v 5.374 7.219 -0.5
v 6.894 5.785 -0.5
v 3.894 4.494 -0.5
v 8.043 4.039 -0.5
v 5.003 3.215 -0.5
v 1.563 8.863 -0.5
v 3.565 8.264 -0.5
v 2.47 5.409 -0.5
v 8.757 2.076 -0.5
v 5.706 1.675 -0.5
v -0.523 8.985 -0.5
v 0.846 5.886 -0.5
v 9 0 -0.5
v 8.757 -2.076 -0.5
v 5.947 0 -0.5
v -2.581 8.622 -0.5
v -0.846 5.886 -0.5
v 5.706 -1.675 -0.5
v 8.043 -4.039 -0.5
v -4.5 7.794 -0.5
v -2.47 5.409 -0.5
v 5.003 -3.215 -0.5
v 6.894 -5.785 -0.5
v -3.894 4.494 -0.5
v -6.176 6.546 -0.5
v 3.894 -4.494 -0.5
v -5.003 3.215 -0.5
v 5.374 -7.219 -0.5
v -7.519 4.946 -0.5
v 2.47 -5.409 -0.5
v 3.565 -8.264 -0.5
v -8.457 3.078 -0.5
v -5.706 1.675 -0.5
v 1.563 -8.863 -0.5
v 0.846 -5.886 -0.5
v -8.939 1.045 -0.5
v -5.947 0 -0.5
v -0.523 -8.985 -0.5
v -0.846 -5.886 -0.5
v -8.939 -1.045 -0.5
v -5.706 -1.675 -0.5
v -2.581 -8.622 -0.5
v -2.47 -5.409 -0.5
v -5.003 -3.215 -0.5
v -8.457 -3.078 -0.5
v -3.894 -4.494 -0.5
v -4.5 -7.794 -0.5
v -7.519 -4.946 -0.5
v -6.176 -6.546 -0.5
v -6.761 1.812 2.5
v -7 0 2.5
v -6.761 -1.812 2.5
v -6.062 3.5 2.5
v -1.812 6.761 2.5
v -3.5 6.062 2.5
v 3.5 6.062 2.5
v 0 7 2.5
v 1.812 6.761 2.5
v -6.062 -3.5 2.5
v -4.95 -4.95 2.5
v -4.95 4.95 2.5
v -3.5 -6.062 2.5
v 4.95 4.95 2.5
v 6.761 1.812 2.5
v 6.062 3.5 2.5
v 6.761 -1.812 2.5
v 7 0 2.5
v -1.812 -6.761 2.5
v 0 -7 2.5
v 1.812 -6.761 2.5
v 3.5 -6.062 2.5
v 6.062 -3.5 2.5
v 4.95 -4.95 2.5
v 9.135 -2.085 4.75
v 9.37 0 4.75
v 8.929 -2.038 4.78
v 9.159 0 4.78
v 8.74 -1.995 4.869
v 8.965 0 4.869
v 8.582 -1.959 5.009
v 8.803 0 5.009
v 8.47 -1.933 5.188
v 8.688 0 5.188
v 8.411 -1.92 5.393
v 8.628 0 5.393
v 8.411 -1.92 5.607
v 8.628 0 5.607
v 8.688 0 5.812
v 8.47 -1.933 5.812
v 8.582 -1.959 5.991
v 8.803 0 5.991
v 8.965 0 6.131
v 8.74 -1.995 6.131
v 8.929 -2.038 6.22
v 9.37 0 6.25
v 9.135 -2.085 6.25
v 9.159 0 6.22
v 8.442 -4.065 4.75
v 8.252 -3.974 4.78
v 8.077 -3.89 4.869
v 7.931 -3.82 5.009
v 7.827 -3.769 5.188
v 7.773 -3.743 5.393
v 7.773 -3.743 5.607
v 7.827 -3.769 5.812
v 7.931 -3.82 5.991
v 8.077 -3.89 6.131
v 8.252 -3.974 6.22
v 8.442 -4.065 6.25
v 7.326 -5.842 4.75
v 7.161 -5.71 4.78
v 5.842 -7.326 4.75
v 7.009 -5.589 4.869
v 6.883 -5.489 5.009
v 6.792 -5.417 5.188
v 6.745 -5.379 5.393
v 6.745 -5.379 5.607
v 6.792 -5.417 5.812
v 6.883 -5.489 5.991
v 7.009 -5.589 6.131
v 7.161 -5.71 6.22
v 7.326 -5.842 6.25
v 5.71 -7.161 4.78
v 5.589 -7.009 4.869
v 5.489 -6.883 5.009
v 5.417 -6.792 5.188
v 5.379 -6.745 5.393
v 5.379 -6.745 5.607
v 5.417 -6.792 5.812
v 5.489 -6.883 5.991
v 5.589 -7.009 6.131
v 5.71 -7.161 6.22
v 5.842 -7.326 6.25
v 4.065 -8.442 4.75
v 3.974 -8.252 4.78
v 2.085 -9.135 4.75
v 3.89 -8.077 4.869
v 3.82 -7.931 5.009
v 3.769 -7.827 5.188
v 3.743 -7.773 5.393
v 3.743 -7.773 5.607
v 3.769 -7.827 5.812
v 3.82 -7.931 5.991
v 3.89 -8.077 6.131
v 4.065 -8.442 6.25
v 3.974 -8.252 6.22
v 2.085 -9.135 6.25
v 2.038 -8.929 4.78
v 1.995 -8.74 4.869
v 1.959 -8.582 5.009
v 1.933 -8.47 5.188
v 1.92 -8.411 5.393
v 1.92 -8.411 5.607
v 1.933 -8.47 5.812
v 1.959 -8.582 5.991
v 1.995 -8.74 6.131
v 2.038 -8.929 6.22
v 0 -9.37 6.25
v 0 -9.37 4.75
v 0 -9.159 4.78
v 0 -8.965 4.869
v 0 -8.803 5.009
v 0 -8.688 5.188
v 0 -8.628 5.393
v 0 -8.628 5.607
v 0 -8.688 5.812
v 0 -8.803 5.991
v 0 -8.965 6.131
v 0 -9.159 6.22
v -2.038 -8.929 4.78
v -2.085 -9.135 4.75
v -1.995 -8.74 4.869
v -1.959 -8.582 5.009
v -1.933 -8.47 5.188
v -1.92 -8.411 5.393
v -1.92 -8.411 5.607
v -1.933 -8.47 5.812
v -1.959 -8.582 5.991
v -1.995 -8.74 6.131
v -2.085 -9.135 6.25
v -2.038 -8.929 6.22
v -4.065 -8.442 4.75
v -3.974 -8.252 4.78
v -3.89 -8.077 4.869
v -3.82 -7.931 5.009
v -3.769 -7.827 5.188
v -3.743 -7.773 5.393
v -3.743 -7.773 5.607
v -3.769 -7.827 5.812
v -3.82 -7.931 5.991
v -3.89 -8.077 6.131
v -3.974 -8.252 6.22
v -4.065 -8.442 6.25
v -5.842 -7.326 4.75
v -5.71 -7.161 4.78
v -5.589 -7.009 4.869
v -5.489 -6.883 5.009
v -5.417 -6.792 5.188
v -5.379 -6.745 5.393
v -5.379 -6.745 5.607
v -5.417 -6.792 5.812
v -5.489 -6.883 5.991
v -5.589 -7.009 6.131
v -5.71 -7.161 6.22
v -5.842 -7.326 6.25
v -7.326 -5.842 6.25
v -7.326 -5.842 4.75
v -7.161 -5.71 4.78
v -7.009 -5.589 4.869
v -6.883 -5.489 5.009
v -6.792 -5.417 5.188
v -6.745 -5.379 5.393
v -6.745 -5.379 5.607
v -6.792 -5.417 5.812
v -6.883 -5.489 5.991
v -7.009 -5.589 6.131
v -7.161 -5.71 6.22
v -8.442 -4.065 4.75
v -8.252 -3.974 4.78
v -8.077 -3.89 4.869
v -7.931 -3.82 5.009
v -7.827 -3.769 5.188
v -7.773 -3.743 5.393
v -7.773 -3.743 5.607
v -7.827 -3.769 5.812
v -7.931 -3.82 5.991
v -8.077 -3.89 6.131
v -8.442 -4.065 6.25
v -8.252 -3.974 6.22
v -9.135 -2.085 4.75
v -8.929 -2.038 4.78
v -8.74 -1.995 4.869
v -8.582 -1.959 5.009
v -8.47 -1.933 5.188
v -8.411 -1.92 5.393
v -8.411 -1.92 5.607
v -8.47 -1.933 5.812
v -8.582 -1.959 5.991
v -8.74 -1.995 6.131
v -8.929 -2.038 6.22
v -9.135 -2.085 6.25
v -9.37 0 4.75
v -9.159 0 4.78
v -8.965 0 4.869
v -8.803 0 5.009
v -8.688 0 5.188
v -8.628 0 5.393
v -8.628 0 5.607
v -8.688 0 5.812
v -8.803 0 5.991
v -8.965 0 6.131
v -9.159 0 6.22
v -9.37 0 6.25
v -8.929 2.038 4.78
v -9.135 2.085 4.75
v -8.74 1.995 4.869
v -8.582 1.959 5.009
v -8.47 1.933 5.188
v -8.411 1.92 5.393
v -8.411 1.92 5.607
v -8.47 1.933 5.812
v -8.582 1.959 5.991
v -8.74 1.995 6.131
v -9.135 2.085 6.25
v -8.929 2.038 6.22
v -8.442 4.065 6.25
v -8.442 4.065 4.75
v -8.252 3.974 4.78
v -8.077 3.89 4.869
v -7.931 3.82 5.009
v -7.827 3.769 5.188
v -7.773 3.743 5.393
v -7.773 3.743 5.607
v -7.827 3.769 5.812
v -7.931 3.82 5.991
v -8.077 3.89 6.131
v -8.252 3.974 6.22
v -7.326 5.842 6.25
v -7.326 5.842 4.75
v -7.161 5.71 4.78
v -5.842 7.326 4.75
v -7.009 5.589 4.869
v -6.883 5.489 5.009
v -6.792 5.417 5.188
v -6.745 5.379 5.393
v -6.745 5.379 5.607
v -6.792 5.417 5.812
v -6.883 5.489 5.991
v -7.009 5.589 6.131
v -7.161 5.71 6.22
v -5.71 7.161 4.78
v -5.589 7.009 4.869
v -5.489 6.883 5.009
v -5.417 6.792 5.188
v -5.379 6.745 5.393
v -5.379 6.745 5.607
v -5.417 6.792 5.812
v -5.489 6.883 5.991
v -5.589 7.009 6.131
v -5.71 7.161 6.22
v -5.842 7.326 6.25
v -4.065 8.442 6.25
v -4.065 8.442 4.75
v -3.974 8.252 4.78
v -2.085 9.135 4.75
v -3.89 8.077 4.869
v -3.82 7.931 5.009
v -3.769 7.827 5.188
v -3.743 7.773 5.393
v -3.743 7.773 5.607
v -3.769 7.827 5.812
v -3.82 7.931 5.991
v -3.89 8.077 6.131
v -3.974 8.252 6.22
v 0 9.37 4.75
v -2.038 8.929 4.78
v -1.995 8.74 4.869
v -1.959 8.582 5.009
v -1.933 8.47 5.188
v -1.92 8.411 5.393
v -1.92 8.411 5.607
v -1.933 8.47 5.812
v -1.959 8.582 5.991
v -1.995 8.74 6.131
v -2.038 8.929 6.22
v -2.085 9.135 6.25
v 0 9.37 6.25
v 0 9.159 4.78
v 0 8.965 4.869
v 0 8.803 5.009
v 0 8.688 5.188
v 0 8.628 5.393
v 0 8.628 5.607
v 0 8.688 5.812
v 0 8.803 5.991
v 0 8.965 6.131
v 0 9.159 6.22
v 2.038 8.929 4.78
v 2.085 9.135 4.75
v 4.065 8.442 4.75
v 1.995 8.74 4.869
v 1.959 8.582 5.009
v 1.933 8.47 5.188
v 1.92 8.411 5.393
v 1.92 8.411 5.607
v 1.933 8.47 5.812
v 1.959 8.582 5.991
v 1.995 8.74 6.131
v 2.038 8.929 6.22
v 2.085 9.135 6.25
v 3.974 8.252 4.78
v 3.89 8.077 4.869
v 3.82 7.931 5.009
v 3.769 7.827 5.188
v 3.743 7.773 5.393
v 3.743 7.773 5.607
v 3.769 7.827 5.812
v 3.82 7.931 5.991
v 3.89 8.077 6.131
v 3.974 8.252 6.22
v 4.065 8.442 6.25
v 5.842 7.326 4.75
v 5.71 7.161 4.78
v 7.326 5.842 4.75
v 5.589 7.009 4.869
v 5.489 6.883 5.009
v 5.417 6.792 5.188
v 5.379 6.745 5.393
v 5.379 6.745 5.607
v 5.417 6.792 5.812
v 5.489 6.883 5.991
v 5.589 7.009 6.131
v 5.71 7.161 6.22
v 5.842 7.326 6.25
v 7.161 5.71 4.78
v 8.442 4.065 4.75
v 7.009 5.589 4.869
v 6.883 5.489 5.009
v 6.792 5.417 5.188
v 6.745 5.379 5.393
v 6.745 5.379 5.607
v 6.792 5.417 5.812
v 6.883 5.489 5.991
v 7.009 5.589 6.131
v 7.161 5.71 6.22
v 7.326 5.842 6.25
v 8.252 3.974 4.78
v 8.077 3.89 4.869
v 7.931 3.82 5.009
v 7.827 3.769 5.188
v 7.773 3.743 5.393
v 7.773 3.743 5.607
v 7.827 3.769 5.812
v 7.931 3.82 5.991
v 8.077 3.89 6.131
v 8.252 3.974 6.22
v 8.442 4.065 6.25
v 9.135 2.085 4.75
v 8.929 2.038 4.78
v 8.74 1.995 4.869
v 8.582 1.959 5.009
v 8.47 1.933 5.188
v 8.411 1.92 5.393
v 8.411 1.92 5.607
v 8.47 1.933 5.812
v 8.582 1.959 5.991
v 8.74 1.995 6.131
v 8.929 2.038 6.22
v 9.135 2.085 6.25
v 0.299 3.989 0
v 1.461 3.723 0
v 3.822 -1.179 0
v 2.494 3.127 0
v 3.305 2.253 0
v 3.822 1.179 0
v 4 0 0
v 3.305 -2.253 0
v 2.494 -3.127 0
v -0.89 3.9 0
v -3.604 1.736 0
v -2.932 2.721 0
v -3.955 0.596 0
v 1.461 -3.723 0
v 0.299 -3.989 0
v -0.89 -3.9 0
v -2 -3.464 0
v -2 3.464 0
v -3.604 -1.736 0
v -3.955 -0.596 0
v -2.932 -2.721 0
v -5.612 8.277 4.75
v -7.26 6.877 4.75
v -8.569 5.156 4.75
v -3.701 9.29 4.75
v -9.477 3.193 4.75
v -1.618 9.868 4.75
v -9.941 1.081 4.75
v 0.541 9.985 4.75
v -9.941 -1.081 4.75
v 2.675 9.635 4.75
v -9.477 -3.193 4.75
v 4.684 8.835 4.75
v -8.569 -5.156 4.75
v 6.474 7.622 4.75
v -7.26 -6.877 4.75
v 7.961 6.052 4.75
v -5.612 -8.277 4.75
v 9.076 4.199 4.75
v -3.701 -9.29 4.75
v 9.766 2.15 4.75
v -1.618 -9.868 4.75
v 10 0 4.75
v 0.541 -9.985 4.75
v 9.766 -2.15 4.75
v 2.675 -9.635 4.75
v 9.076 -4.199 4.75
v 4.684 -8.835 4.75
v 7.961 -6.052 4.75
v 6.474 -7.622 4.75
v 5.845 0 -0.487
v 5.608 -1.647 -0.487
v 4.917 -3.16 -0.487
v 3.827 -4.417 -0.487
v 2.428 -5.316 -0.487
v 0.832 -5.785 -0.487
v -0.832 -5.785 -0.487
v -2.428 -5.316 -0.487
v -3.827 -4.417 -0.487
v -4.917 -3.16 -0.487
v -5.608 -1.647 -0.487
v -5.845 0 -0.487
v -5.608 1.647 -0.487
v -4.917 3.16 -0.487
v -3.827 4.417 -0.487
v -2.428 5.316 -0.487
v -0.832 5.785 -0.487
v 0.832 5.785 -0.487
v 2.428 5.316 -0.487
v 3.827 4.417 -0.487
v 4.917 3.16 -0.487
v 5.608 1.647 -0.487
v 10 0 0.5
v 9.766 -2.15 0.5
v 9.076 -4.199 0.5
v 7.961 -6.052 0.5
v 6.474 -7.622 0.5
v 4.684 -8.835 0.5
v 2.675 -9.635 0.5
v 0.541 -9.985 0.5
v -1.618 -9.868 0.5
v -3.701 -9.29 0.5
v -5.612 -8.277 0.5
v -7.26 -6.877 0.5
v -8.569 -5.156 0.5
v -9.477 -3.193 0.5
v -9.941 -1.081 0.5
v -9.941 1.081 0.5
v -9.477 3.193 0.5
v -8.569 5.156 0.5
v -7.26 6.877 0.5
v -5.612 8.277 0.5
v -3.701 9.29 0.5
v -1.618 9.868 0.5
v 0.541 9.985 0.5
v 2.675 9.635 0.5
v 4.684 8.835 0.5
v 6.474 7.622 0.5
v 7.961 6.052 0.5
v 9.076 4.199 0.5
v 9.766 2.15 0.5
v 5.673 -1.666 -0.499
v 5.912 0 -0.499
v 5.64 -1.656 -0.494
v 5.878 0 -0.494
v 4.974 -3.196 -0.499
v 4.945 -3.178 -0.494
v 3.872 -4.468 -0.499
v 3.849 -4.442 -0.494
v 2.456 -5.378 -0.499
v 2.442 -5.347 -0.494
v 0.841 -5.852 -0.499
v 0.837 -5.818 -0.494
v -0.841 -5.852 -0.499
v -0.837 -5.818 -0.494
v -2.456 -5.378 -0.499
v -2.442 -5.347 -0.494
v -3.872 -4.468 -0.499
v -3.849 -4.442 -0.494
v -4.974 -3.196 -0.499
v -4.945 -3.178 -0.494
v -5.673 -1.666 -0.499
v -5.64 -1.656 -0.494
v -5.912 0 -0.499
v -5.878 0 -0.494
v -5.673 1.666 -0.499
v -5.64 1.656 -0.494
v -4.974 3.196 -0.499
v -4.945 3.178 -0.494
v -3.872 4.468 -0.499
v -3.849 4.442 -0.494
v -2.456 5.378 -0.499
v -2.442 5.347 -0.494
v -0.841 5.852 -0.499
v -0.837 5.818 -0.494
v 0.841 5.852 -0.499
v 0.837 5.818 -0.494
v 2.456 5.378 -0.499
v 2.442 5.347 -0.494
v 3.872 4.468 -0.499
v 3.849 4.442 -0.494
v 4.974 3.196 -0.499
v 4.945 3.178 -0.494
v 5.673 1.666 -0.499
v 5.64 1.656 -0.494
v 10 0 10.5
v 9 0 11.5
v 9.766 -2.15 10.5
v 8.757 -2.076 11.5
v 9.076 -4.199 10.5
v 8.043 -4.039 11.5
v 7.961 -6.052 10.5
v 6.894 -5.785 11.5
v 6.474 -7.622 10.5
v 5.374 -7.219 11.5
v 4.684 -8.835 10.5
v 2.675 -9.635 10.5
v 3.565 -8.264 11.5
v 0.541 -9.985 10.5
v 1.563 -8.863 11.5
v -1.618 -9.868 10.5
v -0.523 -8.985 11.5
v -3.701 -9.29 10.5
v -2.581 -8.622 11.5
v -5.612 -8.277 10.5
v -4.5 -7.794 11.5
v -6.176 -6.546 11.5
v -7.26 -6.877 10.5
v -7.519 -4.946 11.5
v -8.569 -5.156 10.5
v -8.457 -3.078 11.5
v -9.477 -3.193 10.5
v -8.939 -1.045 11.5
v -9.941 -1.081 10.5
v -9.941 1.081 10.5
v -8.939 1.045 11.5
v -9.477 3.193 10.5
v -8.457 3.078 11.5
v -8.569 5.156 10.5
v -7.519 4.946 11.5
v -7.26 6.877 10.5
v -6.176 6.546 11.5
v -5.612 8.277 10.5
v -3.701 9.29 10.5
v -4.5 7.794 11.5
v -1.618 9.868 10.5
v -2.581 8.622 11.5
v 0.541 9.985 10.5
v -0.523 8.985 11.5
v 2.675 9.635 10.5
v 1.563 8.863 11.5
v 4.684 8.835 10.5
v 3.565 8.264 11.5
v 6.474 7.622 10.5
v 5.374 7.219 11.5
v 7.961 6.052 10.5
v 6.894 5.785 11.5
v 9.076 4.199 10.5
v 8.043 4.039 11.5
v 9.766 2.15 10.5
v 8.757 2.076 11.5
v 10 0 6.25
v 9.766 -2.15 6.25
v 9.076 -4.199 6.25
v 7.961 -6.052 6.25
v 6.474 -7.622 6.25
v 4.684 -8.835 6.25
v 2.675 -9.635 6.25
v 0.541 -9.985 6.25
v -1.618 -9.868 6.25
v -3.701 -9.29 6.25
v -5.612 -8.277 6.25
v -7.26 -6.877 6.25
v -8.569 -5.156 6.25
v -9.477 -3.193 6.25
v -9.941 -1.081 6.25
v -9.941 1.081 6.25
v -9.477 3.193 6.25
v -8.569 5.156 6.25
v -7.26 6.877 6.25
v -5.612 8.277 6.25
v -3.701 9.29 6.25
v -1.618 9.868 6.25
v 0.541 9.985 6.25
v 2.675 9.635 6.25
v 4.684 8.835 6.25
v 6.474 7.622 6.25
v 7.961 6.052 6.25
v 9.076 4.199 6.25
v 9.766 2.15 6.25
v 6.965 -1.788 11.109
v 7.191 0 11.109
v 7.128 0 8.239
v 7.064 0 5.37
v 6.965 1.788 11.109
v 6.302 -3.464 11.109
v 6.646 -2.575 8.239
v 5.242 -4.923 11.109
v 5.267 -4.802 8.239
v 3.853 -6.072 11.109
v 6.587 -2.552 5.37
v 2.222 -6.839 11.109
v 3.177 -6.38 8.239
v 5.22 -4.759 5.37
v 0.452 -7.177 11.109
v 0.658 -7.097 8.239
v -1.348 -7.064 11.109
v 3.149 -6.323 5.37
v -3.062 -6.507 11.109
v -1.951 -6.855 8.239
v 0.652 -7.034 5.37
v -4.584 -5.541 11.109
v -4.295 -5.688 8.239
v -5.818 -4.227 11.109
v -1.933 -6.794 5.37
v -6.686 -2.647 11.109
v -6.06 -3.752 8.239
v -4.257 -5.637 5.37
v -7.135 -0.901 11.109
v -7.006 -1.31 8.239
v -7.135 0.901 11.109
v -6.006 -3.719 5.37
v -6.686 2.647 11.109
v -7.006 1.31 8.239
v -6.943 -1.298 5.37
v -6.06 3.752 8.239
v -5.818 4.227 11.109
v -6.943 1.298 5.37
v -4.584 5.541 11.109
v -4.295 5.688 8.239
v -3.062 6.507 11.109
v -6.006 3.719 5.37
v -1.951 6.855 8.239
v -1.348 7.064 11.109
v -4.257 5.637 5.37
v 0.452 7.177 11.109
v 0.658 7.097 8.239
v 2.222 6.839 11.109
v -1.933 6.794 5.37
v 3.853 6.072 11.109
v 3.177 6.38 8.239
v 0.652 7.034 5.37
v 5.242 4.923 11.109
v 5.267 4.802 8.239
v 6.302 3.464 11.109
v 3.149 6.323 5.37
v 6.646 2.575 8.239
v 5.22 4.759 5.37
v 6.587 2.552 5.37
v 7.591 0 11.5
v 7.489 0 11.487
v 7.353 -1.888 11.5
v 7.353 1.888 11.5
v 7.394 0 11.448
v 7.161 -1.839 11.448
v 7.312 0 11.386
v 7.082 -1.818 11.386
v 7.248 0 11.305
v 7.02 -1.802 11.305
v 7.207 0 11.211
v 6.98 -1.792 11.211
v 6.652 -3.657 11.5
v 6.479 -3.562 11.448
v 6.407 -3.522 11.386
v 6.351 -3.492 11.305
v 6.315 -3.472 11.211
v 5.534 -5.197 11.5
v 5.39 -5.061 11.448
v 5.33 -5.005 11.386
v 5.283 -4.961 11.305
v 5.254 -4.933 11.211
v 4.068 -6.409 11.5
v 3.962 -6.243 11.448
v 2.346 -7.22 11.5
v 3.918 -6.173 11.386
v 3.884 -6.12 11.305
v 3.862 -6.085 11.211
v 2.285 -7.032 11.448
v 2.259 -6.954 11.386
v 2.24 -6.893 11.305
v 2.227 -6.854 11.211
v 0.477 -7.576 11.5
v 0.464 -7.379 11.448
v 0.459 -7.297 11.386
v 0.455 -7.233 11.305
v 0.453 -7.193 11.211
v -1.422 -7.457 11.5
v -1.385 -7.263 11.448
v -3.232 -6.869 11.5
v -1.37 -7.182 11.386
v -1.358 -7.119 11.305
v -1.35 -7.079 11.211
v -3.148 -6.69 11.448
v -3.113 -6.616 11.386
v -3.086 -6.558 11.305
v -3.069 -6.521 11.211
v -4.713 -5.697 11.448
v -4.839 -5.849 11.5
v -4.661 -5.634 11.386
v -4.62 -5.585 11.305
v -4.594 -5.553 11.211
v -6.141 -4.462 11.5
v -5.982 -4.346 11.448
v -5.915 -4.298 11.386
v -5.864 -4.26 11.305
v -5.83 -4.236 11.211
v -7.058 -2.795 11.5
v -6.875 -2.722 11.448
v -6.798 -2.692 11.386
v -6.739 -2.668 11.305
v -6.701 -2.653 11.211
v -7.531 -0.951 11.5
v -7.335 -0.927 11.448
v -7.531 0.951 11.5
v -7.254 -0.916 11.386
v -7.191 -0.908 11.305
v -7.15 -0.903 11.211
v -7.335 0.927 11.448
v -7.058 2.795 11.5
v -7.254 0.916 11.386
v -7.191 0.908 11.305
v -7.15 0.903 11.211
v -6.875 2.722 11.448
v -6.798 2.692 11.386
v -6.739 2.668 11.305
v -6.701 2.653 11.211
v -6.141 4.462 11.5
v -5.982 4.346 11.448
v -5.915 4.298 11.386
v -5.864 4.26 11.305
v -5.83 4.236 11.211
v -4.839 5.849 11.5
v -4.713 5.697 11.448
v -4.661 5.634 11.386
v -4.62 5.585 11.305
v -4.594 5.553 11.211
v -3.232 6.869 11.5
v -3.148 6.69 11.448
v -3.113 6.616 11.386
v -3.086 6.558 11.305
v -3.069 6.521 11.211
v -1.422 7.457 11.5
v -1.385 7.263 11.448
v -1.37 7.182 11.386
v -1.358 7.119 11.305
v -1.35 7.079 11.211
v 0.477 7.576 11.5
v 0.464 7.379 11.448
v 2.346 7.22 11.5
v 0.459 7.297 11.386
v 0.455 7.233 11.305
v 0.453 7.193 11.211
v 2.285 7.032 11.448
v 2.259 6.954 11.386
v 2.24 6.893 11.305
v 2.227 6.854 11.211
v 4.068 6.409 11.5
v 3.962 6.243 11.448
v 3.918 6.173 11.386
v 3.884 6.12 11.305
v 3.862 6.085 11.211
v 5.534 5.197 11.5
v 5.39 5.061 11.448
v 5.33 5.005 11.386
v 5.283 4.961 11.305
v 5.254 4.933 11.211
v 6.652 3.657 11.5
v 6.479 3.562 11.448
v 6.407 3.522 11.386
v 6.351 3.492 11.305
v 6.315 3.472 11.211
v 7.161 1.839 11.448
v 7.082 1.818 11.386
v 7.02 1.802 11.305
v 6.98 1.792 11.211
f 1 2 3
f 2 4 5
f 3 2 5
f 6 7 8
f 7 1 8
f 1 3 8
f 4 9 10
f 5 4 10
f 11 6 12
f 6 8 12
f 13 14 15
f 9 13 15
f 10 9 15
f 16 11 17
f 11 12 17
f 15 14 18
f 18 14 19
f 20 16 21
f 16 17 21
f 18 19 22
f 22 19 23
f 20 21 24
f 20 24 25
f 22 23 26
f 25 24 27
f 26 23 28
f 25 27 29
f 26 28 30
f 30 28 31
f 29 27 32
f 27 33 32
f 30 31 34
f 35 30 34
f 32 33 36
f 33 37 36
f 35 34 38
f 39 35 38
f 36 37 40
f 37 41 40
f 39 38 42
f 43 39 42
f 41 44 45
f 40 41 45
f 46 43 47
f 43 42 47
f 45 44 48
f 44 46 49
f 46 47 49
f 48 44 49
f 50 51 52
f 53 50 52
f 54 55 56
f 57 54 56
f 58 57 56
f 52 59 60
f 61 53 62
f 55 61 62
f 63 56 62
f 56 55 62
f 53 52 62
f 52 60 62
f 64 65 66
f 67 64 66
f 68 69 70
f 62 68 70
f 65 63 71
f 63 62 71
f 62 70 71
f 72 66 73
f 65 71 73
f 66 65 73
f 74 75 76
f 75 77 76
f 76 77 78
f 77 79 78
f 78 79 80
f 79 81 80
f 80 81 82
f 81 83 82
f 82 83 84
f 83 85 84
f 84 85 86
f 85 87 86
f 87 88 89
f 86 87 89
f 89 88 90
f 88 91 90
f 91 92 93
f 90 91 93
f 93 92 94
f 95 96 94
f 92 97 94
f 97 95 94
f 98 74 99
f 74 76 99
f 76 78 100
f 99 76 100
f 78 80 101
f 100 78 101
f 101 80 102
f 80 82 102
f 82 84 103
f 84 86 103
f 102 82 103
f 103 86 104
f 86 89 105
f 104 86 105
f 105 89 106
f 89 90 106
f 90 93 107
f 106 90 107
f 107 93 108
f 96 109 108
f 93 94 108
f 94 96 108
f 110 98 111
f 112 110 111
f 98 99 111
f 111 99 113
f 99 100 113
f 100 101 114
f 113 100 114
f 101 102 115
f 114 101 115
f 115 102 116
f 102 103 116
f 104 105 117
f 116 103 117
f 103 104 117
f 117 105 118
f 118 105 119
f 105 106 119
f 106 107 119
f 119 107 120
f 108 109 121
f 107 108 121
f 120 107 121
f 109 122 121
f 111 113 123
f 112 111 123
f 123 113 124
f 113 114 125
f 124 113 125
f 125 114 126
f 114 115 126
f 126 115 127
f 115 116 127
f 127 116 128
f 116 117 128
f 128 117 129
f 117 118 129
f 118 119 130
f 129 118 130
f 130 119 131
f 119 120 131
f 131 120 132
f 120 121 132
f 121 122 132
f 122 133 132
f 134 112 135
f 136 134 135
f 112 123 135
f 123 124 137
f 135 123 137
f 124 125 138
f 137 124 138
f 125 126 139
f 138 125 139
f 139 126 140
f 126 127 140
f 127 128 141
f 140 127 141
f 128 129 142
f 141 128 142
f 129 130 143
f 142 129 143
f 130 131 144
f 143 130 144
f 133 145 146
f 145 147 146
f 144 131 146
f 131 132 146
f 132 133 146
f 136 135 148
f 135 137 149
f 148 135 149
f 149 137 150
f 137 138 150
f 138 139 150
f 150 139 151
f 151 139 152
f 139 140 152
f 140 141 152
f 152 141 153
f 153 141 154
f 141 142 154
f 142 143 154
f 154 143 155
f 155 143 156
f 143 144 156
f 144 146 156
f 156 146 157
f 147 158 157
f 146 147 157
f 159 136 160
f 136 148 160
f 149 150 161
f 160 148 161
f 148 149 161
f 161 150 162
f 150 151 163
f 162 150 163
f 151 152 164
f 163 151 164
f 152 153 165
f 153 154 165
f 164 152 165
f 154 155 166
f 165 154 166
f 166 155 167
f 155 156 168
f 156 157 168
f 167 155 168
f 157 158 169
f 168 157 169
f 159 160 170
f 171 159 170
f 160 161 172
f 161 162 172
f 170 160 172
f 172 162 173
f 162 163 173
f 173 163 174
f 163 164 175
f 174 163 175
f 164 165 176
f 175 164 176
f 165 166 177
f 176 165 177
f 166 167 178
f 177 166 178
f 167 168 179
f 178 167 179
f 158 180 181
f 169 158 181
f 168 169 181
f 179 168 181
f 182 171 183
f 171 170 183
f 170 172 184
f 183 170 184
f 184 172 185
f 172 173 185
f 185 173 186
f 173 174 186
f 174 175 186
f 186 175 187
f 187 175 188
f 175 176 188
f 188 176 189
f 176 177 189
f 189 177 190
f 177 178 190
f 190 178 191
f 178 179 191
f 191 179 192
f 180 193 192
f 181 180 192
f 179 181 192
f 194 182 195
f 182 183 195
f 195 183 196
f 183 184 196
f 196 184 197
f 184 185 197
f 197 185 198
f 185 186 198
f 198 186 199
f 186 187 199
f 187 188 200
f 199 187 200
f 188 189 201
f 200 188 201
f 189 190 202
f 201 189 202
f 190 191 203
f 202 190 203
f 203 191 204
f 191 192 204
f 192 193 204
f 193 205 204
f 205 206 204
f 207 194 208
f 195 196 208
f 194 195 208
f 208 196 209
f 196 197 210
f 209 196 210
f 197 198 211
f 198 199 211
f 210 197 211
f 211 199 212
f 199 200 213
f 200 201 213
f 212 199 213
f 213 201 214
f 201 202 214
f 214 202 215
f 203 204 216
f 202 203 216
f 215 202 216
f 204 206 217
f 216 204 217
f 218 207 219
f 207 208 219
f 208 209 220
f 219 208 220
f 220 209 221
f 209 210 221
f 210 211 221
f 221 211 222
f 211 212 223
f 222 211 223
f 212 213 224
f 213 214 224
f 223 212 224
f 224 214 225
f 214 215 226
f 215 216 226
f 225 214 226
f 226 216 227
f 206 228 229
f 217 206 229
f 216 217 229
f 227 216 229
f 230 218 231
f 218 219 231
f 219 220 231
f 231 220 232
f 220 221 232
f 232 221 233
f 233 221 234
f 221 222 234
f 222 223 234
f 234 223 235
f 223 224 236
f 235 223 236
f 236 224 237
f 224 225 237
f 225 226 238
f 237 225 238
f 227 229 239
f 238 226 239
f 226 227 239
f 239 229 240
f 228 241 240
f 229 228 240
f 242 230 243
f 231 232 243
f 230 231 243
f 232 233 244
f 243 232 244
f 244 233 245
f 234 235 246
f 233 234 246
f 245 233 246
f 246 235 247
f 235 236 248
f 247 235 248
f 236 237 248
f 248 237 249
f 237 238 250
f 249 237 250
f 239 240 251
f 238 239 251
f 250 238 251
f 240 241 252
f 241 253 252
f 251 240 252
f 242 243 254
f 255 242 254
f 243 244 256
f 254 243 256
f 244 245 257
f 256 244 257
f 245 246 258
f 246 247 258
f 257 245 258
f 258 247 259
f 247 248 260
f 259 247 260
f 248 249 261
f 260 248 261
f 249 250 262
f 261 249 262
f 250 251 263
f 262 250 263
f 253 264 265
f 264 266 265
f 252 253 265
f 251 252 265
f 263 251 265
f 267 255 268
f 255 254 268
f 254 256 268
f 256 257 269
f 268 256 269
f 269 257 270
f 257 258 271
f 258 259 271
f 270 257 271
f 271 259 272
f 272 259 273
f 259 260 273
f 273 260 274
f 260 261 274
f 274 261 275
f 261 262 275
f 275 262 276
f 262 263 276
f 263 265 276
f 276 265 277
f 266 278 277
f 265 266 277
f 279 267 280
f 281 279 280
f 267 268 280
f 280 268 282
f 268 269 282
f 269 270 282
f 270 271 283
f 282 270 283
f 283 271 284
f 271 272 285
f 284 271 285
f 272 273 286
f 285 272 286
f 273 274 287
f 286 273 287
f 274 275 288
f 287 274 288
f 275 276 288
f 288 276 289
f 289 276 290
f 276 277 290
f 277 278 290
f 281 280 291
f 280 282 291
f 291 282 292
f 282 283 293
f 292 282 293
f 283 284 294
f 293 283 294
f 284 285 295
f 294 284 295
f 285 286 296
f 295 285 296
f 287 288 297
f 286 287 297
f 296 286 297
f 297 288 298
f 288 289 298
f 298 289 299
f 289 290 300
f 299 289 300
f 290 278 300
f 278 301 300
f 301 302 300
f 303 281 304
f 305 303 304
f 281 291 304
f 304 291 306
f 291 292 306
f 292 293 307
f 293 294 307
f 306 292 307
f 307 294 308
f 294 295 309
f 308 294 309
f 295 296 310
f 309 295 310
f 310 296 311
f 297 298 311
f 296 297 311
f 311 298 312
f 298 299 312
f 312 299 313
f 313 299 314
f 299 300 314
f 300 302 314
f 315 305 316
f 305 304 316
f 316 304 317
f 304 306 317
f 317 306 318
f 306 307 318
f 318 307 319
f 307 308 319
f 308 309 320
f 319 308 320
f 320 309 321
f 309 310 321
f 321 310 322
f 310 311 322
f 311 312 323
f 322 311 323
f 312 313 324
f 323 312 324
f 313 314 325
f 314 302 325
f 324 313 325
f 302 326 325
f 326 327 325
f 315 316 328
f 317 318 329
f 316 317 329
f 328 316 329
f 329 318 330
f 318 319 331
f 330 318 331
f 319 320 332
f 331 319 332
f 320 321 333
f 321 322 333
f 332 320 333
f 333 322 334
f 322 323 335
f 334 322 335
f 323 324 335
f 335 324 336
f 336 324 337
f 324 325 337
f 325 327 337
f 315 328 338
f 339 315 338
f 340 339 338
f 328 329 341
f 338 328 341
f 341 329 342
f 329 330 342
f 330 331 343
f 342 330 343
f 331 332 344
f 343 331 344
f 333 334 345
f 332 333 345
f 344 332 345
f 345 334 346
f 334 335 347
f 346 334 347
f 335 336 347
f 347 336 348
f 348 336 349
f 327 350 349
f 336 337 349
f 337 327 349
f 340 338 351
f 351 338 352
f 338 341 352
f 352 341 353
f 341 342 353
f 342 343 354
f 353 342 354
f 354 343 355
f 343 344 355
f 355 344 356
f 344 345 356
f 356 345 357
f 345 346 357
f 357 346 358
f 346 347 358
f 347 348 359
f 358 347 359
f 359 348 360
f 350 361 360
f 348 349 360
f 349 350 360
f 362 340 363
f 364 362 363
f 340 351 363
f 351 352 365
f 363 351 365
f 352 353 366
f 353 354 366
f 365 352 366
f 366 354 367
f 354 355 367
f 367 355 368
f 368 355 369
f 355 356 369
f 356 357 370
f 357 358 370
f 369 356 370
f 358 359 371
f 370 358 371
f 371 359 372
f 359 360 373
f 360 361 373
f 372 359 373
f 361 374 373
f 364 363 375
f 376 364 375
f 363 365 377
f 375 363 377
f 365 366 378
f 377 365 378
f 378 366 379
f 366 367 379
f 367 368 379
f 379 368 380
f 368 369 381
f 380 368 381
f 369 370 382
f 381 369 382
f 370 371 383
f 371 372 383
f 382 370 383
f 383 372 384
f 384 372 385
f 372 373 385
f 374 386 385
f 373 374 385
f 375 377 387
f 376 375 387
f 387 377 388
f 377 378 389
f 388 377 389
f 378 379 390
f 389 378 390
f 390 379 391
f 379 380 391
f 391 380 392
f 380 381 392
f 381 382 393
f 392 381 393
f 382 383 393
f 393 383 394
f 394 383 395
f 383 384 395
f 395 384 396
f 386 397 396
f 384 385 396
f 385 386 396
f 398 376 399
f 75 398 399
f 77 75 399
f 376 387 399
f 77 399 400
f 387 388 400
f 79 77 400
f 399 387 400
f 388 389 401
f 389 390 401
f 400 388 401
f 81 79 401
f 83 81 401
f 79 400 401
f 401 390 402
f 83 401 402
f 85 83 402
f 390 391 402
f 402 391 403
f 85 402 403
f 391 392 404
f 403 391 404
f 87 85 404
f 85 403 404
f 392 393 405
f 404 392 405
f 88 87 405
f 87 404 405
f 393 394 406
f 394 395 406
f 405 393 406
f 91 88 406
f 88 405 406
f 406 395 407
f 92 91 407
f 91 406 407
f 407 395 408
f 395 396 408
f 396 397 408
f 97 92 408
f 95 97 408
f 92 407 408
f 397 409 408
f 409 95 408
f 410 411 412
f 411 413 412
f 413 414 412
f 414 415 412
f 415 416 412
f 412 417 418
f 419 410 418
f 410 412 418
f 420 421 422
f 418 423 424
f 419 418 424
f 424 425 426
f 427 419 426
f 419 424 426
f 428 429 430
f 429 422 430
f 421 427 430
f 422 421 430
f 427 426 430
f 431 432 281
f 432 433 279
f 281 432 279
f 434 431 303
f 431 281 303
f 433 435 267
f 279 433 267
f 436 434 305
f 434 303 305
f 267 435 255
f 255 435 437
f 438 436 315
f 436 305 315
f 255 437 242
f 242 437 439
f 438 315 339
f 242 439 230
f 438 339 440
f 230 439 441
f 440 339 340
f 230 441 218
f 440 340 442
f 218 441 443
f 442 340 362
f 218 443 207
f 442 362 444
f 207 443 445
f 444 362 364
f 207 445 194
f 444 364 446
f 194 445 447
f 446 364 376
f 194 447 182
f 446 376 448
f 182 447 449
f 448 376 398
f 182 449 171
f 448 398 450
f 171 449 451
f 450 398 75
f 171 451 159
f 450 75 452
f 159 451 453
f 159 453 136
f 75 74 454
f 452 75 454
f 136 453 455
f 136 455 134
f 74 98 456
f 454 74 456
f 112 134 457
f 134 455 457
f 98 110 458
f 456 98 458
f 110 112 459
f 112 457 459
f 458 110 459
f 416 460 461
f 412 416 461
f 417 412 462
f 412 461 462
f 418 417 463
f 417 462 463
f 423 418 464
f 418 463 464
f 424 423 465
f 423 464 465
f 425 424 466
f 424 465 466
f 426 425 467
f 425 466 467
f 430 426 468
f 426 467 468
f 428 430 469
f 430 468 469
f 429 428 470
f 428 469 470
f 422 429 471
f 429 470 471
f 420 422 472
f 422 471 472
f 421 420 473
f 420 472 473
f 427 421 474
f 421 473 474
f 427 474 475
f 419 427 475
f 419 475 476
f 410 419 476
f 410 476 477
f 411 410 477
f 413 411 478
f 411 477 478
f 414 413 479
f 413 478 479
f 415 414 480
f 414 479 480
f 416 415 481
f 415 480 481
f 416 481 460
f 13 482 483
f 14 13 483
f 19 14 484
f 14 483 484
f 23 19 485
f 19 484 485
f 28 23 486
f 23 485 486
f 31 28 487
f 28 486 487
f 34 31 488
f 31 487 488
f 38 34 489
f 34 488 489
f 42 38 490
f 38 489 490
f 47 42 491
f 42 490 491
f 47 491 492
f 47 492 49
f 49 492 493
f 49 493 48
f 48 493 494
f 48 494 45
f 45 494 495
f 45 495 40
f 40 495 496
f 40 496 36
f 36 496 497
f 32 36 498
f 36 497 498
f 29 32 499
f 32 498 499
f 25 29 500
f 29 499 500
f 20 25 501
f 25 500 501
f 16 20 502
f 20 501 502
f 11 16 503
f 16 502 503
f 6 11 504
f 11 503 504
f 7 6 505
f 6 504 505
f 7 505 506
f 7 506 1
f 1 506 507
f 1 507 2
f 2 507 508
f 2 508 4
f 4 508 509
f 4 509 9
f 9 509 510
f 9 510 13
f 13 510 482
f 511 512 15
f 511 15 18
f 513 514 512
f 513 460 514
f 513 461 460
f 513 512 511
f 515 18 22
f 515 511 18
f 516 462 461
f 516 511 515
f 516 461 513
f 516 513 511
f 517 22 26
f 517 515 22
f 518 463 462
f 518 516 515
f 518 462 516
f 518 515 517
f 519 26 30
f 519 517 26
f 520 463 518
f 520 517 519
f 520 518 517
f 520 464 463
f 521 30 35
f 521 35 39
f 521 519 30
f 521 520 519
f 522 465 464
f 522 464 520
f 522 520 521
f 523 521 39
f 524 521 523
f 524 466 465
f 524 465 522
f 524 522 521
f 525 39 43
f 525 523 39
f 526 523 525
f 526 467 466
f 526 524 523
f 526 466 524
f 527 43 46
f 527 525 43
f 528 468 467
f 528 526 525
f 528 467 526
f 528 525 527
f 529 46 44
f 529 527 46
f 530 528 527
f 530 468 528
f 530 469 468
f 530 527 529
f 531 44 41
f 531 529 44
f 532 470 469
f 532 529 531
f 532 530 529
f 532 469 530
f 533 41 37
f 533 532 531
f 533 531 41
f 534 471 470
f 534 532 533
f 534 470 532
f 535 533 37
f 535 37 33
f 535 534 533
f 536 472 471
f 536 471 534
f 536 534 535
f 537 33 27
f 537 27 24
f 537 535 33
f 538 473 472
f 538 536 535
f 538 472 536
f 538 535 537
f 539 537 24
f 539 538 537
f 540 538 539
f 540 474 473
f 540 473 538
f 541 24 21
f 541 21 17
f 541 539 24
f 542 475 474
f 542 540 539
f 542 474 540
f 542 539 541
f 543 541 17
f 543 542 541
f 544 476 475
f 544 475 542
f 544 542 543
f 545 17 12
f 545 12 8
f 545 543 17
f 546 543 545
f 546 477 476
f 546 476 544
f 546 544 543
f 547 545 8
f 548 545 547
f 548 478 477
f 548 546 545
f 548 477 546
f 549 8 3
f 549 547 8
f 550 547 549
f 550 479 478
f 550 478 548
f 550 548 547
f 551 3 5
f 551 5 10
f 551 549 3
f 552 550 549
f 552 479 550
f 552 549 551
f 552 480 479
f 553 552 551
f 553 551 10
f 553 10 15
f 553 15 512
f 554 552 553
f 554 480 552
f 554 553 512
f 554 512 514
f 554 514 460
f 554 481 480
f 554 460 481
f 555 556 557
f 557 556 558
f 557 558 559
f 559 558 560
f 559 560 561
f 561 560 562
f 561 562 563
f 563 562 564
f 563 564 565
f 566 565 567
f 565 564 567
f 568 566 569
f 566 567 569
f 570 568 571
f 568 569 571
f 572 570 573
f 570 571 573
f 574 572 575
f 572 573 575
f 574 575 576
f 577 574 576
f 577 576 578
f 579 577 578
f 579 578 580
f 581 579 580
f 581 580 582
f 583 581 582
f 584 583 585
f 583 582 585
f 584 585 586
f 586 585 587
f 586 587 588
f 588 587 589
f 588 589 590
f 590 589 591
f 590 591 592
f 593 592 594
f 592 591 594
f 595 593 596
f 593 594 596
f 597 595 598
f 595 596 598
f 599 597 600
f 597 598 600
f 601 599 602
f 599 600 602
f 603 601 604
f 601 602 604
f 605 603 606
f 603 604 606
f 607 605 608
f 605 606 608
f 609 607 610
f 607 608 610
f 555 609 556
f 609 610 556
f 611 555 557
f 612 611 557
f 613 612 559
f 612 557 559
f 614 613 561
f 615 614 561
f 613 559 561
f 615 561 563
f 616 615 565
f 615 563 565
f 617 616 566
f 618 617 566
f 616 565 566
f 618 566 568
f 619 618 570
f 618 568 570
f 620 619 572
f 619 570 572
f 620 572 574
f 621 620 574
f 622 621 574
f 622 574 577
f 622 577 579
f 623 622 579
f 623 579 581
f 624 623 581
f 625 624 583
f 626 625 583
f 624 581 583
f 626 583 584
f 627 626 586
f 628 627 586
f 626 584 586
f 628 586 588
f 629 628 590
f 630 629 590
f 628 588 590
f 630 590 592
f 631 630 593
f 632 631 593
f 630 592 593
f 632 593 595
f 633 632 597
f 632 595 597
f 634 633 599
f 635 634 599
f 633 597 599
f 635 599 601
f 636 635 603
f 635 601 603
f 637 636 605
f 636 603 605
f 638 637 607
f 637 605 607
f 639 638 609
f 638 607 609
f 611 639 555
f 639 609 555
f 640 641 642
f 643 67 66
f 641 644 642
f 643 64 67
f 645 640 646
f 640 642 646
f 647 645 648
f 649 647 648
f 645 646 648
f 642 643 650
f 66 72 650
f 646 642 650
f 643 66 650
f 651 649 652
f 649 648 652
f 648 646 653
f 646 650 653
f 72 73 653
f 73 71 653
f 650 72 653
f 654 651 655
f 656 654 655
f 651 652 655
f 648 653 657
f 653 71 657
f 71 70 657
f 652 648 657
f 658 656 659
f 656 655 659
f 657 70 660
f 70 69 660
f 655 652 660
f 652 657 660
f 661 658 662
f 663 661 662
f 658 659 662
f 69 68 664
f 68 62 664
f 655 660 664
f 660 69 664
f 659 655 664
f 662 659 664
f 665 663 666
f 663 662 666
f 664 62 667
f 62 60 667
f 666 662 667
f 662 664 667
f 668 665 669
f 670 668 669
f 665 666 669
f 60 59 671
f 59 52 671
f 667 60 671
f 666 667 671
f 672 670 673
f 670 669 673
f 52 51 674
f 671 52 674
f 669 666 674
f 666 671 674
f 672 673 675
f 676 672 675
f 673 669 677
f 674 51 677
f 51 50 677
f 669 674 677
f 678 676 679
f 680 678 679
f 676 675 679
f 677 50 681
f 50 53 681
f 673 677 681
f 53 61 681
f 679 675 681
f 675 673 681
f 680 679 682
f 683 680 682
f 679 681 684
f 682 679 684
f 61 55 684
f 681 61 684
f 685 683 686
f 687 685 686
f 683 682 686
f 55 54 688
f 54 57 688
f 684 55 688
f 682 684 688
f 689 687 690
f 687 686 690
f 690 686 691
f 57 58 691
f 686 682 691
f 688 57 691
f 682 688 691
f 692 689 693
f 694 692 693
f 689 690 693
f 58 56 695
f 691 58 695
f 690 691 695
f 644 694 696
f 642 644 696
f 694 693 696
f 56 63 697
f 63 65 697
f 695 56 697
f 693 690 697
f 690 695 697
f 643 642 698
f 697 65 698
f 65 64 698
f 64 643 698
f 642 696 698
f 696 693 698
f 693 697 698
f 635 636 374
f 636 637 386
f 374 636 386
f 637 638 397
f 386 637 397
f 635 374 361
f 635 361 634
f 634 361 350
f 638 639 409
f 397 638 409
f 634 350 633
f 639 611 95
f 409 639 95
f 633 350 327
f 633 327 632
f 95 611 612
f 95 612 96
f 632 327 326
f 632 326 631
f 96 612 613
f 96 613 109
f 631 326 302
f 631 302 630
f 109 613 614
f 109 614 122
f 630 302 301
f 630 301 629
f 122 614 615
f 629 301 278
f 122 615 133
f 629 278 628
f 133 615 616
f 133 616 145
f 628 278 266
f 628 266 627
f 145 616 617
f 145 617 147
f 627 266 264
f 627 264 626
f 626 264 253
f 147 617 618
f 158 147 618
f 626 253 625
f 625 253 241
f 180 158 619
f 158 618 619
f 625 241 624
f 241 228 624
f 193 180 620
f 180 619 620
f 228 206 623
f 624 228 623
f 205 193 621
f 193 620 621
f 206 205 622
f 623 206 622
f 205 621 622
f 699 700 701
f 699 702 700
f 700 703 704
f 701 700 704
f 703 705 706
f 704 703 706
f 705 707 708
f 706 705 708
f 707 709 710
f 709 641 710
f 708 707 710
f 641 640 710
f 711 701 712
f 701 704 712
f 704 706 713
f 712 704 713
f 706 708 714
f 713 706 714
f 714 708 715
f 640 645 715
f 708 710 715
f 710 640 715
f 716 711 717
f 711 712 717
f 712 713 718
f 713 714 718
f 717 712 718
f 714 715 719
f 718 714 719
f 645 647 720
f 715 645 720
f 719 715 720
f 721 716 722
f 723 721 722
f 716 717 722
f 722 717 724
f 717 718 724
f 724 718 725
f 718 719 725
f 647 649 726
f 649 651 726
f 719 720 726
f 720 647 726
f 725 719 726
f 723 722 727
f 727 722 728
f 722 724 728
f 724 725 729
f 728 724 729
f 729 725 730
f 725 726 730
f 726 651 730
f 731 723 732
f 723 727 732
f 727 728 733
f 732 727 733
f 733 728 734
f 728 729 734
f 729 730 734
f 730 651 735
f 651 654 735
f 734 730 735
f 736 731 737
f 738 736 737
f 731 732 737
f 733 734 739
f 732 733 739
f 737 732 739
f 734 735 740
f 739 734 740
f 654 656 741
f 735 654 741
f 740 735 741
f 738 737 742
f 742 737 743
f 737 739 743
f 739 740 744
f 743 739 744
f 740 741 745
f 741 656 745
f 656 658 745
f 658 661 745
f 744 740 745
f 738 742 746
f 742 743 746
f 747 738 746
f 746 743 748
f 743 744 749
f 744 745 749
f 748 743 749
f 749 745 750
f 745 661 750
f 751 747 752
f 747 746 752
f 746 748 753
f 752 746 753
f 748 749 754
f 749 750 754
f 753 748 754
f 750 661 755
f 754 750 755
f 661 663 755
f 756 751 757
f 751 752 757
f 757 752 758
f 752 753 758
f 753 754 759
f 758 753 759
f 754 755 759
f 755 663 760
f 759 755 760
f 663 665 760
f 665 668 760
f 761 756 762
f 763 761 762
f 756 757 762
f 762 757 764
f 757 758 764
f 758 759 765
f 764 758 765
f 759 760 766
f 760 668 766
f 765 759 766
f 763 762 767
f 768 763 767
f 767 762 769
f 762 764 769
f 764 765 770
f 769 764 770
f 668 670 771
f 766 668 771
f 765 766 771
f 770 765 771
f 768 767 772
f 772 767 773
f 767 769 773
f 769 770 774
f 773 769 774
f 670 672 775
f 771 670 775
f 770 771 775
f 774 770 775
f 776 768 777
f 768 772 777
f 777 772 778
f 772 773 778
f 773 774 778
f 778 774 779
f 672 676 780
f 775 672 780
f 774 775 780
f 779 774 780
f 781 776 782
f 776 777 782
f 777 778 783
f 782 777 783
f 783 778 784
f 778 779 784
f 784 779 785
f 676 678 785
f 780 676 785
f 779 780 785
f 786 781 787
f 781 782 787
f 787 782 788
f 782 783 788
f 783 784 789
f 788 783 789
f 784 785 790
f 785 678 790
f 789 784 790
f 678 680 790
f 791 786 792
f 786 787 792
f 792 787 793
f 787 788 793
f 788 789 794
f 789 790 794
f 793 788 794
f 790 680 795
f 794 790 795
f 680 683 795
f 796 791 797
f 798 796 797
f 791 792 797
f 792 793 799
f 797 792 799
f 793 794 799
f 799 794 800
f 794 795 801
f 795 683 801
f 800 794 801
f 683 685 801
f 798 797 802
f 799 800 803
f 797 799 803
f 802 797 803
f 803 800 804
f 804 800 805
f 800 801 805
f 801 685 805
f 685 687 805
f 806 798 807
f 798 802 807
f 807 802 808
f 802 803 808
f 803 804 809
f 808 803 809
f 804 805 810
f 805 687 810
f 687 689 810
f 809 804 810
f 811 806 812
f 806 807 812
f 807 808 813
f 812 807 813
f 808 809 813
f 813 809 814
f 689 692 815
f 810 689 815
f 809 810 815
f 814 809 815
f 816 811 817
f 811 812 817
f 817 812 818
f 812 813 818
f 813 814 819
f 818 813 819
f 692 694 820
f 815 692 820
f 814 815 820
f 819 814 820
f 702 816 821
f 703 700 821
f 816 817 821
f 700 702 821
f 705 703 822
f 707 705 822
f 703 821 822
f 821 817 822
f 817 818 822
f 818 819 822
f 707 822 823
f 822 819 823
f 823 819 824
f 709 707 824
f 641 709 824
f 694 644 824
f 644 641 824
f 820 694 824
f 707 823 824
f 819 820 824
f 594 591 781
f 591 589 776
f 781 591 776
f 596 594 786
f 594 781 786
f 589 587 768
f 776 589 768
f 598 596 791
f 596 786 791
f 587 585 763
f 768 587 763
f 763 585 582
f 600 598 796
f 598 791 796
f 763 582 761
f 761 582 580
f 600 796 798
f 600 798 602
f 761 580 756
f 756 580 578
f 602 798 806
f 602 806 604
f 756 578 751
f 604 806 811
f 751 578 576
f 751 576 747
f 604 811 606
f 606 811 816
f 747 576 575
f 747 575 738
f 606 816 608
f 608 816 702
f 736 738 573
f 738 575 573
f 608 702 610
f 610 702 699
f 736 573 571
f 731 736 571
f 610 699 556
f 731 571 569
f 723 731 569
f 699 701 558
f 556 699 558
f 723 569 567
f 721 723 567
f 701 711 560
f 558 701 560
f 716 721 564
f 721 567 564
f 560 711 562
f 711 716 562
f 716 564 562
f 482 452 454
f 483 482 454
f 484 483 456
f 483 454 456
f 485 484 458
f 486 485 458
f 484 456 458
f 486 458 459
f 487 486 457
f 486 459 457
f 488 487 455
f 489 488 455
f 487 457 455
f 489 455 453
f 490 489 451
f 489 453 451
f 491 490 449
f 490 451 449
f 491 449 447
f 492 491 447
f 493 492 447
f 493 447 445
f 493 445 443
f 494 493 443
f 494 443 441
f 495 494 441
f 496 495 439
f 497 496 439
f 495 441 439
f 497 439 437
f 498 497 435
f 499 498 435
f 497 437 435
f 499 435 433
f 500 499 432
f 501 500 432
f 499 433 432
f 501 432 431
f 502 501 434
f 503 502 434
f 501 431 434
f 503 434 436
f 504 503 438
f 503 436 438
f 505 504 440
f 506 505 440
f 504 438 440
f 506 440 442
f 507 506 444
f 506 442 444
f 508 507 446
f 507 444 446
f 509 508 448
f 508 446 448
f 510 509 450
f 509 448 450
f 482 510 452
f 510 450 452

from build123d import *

# Parameters (mm, degrees)
CHAMFER_1_SIZE = 1
FILLET_1_R     = 0.4


with BuildPart() as part:
    # 스케치1 → 회전1 (revolve)
    with BuildSketch(Plane(origin=(0, 0, 0), x_dir=(1, 0, 0), z_dir=(0, 1, 0))):
        with BuildLine():
            Line((0, 0), (4, 0))
            Line((4, 0), (5.894700279, 0.5))
            Line((5.894700279, 0.5), (10, 0.5))
            Line((10, 0.5), (10, -4.75))
            Line((10, -4.75), (9.37, -4.75))
            ThreePointArc((9.37, -4.75), (8.62, -5.5), (9.37, -6.25))
            Line((9.37, -6.25), (10, -6.25))
            Line((10, -6.25), (10, -11.5))
            Line((10, -11.5), (7.2, -11.5))
            Line((7.2, -11.5), (7, -2.5))
            Line((7, -2.5), (0, -2.5))
            Line((0, -2.5), (0, 0))
        make_face()
    revolve(axis=Axis((0, 0, 2.5), (0, 0, -1)))

    # 모따기1
    chamfer_1_edges = [part.edges().sort_by_distance(p)[0] for p in [
        (-10, 0, 11.5),
        (-10, 0, -0.5),
    ]]
    chamfer(chamfer_1_edges, length=CHAMFER_1_SIZE)

    # 필렛1
    fillet_1_edges = [part.edges().sort_by_distance(p)[0] for p in [
        (-7.2, 0, 11.5),
        (-5.894700279, 0, -0.5),
    ]]
    fillet(fillet_1_edges, radius=FILLET_1_R)


solid = part.part
